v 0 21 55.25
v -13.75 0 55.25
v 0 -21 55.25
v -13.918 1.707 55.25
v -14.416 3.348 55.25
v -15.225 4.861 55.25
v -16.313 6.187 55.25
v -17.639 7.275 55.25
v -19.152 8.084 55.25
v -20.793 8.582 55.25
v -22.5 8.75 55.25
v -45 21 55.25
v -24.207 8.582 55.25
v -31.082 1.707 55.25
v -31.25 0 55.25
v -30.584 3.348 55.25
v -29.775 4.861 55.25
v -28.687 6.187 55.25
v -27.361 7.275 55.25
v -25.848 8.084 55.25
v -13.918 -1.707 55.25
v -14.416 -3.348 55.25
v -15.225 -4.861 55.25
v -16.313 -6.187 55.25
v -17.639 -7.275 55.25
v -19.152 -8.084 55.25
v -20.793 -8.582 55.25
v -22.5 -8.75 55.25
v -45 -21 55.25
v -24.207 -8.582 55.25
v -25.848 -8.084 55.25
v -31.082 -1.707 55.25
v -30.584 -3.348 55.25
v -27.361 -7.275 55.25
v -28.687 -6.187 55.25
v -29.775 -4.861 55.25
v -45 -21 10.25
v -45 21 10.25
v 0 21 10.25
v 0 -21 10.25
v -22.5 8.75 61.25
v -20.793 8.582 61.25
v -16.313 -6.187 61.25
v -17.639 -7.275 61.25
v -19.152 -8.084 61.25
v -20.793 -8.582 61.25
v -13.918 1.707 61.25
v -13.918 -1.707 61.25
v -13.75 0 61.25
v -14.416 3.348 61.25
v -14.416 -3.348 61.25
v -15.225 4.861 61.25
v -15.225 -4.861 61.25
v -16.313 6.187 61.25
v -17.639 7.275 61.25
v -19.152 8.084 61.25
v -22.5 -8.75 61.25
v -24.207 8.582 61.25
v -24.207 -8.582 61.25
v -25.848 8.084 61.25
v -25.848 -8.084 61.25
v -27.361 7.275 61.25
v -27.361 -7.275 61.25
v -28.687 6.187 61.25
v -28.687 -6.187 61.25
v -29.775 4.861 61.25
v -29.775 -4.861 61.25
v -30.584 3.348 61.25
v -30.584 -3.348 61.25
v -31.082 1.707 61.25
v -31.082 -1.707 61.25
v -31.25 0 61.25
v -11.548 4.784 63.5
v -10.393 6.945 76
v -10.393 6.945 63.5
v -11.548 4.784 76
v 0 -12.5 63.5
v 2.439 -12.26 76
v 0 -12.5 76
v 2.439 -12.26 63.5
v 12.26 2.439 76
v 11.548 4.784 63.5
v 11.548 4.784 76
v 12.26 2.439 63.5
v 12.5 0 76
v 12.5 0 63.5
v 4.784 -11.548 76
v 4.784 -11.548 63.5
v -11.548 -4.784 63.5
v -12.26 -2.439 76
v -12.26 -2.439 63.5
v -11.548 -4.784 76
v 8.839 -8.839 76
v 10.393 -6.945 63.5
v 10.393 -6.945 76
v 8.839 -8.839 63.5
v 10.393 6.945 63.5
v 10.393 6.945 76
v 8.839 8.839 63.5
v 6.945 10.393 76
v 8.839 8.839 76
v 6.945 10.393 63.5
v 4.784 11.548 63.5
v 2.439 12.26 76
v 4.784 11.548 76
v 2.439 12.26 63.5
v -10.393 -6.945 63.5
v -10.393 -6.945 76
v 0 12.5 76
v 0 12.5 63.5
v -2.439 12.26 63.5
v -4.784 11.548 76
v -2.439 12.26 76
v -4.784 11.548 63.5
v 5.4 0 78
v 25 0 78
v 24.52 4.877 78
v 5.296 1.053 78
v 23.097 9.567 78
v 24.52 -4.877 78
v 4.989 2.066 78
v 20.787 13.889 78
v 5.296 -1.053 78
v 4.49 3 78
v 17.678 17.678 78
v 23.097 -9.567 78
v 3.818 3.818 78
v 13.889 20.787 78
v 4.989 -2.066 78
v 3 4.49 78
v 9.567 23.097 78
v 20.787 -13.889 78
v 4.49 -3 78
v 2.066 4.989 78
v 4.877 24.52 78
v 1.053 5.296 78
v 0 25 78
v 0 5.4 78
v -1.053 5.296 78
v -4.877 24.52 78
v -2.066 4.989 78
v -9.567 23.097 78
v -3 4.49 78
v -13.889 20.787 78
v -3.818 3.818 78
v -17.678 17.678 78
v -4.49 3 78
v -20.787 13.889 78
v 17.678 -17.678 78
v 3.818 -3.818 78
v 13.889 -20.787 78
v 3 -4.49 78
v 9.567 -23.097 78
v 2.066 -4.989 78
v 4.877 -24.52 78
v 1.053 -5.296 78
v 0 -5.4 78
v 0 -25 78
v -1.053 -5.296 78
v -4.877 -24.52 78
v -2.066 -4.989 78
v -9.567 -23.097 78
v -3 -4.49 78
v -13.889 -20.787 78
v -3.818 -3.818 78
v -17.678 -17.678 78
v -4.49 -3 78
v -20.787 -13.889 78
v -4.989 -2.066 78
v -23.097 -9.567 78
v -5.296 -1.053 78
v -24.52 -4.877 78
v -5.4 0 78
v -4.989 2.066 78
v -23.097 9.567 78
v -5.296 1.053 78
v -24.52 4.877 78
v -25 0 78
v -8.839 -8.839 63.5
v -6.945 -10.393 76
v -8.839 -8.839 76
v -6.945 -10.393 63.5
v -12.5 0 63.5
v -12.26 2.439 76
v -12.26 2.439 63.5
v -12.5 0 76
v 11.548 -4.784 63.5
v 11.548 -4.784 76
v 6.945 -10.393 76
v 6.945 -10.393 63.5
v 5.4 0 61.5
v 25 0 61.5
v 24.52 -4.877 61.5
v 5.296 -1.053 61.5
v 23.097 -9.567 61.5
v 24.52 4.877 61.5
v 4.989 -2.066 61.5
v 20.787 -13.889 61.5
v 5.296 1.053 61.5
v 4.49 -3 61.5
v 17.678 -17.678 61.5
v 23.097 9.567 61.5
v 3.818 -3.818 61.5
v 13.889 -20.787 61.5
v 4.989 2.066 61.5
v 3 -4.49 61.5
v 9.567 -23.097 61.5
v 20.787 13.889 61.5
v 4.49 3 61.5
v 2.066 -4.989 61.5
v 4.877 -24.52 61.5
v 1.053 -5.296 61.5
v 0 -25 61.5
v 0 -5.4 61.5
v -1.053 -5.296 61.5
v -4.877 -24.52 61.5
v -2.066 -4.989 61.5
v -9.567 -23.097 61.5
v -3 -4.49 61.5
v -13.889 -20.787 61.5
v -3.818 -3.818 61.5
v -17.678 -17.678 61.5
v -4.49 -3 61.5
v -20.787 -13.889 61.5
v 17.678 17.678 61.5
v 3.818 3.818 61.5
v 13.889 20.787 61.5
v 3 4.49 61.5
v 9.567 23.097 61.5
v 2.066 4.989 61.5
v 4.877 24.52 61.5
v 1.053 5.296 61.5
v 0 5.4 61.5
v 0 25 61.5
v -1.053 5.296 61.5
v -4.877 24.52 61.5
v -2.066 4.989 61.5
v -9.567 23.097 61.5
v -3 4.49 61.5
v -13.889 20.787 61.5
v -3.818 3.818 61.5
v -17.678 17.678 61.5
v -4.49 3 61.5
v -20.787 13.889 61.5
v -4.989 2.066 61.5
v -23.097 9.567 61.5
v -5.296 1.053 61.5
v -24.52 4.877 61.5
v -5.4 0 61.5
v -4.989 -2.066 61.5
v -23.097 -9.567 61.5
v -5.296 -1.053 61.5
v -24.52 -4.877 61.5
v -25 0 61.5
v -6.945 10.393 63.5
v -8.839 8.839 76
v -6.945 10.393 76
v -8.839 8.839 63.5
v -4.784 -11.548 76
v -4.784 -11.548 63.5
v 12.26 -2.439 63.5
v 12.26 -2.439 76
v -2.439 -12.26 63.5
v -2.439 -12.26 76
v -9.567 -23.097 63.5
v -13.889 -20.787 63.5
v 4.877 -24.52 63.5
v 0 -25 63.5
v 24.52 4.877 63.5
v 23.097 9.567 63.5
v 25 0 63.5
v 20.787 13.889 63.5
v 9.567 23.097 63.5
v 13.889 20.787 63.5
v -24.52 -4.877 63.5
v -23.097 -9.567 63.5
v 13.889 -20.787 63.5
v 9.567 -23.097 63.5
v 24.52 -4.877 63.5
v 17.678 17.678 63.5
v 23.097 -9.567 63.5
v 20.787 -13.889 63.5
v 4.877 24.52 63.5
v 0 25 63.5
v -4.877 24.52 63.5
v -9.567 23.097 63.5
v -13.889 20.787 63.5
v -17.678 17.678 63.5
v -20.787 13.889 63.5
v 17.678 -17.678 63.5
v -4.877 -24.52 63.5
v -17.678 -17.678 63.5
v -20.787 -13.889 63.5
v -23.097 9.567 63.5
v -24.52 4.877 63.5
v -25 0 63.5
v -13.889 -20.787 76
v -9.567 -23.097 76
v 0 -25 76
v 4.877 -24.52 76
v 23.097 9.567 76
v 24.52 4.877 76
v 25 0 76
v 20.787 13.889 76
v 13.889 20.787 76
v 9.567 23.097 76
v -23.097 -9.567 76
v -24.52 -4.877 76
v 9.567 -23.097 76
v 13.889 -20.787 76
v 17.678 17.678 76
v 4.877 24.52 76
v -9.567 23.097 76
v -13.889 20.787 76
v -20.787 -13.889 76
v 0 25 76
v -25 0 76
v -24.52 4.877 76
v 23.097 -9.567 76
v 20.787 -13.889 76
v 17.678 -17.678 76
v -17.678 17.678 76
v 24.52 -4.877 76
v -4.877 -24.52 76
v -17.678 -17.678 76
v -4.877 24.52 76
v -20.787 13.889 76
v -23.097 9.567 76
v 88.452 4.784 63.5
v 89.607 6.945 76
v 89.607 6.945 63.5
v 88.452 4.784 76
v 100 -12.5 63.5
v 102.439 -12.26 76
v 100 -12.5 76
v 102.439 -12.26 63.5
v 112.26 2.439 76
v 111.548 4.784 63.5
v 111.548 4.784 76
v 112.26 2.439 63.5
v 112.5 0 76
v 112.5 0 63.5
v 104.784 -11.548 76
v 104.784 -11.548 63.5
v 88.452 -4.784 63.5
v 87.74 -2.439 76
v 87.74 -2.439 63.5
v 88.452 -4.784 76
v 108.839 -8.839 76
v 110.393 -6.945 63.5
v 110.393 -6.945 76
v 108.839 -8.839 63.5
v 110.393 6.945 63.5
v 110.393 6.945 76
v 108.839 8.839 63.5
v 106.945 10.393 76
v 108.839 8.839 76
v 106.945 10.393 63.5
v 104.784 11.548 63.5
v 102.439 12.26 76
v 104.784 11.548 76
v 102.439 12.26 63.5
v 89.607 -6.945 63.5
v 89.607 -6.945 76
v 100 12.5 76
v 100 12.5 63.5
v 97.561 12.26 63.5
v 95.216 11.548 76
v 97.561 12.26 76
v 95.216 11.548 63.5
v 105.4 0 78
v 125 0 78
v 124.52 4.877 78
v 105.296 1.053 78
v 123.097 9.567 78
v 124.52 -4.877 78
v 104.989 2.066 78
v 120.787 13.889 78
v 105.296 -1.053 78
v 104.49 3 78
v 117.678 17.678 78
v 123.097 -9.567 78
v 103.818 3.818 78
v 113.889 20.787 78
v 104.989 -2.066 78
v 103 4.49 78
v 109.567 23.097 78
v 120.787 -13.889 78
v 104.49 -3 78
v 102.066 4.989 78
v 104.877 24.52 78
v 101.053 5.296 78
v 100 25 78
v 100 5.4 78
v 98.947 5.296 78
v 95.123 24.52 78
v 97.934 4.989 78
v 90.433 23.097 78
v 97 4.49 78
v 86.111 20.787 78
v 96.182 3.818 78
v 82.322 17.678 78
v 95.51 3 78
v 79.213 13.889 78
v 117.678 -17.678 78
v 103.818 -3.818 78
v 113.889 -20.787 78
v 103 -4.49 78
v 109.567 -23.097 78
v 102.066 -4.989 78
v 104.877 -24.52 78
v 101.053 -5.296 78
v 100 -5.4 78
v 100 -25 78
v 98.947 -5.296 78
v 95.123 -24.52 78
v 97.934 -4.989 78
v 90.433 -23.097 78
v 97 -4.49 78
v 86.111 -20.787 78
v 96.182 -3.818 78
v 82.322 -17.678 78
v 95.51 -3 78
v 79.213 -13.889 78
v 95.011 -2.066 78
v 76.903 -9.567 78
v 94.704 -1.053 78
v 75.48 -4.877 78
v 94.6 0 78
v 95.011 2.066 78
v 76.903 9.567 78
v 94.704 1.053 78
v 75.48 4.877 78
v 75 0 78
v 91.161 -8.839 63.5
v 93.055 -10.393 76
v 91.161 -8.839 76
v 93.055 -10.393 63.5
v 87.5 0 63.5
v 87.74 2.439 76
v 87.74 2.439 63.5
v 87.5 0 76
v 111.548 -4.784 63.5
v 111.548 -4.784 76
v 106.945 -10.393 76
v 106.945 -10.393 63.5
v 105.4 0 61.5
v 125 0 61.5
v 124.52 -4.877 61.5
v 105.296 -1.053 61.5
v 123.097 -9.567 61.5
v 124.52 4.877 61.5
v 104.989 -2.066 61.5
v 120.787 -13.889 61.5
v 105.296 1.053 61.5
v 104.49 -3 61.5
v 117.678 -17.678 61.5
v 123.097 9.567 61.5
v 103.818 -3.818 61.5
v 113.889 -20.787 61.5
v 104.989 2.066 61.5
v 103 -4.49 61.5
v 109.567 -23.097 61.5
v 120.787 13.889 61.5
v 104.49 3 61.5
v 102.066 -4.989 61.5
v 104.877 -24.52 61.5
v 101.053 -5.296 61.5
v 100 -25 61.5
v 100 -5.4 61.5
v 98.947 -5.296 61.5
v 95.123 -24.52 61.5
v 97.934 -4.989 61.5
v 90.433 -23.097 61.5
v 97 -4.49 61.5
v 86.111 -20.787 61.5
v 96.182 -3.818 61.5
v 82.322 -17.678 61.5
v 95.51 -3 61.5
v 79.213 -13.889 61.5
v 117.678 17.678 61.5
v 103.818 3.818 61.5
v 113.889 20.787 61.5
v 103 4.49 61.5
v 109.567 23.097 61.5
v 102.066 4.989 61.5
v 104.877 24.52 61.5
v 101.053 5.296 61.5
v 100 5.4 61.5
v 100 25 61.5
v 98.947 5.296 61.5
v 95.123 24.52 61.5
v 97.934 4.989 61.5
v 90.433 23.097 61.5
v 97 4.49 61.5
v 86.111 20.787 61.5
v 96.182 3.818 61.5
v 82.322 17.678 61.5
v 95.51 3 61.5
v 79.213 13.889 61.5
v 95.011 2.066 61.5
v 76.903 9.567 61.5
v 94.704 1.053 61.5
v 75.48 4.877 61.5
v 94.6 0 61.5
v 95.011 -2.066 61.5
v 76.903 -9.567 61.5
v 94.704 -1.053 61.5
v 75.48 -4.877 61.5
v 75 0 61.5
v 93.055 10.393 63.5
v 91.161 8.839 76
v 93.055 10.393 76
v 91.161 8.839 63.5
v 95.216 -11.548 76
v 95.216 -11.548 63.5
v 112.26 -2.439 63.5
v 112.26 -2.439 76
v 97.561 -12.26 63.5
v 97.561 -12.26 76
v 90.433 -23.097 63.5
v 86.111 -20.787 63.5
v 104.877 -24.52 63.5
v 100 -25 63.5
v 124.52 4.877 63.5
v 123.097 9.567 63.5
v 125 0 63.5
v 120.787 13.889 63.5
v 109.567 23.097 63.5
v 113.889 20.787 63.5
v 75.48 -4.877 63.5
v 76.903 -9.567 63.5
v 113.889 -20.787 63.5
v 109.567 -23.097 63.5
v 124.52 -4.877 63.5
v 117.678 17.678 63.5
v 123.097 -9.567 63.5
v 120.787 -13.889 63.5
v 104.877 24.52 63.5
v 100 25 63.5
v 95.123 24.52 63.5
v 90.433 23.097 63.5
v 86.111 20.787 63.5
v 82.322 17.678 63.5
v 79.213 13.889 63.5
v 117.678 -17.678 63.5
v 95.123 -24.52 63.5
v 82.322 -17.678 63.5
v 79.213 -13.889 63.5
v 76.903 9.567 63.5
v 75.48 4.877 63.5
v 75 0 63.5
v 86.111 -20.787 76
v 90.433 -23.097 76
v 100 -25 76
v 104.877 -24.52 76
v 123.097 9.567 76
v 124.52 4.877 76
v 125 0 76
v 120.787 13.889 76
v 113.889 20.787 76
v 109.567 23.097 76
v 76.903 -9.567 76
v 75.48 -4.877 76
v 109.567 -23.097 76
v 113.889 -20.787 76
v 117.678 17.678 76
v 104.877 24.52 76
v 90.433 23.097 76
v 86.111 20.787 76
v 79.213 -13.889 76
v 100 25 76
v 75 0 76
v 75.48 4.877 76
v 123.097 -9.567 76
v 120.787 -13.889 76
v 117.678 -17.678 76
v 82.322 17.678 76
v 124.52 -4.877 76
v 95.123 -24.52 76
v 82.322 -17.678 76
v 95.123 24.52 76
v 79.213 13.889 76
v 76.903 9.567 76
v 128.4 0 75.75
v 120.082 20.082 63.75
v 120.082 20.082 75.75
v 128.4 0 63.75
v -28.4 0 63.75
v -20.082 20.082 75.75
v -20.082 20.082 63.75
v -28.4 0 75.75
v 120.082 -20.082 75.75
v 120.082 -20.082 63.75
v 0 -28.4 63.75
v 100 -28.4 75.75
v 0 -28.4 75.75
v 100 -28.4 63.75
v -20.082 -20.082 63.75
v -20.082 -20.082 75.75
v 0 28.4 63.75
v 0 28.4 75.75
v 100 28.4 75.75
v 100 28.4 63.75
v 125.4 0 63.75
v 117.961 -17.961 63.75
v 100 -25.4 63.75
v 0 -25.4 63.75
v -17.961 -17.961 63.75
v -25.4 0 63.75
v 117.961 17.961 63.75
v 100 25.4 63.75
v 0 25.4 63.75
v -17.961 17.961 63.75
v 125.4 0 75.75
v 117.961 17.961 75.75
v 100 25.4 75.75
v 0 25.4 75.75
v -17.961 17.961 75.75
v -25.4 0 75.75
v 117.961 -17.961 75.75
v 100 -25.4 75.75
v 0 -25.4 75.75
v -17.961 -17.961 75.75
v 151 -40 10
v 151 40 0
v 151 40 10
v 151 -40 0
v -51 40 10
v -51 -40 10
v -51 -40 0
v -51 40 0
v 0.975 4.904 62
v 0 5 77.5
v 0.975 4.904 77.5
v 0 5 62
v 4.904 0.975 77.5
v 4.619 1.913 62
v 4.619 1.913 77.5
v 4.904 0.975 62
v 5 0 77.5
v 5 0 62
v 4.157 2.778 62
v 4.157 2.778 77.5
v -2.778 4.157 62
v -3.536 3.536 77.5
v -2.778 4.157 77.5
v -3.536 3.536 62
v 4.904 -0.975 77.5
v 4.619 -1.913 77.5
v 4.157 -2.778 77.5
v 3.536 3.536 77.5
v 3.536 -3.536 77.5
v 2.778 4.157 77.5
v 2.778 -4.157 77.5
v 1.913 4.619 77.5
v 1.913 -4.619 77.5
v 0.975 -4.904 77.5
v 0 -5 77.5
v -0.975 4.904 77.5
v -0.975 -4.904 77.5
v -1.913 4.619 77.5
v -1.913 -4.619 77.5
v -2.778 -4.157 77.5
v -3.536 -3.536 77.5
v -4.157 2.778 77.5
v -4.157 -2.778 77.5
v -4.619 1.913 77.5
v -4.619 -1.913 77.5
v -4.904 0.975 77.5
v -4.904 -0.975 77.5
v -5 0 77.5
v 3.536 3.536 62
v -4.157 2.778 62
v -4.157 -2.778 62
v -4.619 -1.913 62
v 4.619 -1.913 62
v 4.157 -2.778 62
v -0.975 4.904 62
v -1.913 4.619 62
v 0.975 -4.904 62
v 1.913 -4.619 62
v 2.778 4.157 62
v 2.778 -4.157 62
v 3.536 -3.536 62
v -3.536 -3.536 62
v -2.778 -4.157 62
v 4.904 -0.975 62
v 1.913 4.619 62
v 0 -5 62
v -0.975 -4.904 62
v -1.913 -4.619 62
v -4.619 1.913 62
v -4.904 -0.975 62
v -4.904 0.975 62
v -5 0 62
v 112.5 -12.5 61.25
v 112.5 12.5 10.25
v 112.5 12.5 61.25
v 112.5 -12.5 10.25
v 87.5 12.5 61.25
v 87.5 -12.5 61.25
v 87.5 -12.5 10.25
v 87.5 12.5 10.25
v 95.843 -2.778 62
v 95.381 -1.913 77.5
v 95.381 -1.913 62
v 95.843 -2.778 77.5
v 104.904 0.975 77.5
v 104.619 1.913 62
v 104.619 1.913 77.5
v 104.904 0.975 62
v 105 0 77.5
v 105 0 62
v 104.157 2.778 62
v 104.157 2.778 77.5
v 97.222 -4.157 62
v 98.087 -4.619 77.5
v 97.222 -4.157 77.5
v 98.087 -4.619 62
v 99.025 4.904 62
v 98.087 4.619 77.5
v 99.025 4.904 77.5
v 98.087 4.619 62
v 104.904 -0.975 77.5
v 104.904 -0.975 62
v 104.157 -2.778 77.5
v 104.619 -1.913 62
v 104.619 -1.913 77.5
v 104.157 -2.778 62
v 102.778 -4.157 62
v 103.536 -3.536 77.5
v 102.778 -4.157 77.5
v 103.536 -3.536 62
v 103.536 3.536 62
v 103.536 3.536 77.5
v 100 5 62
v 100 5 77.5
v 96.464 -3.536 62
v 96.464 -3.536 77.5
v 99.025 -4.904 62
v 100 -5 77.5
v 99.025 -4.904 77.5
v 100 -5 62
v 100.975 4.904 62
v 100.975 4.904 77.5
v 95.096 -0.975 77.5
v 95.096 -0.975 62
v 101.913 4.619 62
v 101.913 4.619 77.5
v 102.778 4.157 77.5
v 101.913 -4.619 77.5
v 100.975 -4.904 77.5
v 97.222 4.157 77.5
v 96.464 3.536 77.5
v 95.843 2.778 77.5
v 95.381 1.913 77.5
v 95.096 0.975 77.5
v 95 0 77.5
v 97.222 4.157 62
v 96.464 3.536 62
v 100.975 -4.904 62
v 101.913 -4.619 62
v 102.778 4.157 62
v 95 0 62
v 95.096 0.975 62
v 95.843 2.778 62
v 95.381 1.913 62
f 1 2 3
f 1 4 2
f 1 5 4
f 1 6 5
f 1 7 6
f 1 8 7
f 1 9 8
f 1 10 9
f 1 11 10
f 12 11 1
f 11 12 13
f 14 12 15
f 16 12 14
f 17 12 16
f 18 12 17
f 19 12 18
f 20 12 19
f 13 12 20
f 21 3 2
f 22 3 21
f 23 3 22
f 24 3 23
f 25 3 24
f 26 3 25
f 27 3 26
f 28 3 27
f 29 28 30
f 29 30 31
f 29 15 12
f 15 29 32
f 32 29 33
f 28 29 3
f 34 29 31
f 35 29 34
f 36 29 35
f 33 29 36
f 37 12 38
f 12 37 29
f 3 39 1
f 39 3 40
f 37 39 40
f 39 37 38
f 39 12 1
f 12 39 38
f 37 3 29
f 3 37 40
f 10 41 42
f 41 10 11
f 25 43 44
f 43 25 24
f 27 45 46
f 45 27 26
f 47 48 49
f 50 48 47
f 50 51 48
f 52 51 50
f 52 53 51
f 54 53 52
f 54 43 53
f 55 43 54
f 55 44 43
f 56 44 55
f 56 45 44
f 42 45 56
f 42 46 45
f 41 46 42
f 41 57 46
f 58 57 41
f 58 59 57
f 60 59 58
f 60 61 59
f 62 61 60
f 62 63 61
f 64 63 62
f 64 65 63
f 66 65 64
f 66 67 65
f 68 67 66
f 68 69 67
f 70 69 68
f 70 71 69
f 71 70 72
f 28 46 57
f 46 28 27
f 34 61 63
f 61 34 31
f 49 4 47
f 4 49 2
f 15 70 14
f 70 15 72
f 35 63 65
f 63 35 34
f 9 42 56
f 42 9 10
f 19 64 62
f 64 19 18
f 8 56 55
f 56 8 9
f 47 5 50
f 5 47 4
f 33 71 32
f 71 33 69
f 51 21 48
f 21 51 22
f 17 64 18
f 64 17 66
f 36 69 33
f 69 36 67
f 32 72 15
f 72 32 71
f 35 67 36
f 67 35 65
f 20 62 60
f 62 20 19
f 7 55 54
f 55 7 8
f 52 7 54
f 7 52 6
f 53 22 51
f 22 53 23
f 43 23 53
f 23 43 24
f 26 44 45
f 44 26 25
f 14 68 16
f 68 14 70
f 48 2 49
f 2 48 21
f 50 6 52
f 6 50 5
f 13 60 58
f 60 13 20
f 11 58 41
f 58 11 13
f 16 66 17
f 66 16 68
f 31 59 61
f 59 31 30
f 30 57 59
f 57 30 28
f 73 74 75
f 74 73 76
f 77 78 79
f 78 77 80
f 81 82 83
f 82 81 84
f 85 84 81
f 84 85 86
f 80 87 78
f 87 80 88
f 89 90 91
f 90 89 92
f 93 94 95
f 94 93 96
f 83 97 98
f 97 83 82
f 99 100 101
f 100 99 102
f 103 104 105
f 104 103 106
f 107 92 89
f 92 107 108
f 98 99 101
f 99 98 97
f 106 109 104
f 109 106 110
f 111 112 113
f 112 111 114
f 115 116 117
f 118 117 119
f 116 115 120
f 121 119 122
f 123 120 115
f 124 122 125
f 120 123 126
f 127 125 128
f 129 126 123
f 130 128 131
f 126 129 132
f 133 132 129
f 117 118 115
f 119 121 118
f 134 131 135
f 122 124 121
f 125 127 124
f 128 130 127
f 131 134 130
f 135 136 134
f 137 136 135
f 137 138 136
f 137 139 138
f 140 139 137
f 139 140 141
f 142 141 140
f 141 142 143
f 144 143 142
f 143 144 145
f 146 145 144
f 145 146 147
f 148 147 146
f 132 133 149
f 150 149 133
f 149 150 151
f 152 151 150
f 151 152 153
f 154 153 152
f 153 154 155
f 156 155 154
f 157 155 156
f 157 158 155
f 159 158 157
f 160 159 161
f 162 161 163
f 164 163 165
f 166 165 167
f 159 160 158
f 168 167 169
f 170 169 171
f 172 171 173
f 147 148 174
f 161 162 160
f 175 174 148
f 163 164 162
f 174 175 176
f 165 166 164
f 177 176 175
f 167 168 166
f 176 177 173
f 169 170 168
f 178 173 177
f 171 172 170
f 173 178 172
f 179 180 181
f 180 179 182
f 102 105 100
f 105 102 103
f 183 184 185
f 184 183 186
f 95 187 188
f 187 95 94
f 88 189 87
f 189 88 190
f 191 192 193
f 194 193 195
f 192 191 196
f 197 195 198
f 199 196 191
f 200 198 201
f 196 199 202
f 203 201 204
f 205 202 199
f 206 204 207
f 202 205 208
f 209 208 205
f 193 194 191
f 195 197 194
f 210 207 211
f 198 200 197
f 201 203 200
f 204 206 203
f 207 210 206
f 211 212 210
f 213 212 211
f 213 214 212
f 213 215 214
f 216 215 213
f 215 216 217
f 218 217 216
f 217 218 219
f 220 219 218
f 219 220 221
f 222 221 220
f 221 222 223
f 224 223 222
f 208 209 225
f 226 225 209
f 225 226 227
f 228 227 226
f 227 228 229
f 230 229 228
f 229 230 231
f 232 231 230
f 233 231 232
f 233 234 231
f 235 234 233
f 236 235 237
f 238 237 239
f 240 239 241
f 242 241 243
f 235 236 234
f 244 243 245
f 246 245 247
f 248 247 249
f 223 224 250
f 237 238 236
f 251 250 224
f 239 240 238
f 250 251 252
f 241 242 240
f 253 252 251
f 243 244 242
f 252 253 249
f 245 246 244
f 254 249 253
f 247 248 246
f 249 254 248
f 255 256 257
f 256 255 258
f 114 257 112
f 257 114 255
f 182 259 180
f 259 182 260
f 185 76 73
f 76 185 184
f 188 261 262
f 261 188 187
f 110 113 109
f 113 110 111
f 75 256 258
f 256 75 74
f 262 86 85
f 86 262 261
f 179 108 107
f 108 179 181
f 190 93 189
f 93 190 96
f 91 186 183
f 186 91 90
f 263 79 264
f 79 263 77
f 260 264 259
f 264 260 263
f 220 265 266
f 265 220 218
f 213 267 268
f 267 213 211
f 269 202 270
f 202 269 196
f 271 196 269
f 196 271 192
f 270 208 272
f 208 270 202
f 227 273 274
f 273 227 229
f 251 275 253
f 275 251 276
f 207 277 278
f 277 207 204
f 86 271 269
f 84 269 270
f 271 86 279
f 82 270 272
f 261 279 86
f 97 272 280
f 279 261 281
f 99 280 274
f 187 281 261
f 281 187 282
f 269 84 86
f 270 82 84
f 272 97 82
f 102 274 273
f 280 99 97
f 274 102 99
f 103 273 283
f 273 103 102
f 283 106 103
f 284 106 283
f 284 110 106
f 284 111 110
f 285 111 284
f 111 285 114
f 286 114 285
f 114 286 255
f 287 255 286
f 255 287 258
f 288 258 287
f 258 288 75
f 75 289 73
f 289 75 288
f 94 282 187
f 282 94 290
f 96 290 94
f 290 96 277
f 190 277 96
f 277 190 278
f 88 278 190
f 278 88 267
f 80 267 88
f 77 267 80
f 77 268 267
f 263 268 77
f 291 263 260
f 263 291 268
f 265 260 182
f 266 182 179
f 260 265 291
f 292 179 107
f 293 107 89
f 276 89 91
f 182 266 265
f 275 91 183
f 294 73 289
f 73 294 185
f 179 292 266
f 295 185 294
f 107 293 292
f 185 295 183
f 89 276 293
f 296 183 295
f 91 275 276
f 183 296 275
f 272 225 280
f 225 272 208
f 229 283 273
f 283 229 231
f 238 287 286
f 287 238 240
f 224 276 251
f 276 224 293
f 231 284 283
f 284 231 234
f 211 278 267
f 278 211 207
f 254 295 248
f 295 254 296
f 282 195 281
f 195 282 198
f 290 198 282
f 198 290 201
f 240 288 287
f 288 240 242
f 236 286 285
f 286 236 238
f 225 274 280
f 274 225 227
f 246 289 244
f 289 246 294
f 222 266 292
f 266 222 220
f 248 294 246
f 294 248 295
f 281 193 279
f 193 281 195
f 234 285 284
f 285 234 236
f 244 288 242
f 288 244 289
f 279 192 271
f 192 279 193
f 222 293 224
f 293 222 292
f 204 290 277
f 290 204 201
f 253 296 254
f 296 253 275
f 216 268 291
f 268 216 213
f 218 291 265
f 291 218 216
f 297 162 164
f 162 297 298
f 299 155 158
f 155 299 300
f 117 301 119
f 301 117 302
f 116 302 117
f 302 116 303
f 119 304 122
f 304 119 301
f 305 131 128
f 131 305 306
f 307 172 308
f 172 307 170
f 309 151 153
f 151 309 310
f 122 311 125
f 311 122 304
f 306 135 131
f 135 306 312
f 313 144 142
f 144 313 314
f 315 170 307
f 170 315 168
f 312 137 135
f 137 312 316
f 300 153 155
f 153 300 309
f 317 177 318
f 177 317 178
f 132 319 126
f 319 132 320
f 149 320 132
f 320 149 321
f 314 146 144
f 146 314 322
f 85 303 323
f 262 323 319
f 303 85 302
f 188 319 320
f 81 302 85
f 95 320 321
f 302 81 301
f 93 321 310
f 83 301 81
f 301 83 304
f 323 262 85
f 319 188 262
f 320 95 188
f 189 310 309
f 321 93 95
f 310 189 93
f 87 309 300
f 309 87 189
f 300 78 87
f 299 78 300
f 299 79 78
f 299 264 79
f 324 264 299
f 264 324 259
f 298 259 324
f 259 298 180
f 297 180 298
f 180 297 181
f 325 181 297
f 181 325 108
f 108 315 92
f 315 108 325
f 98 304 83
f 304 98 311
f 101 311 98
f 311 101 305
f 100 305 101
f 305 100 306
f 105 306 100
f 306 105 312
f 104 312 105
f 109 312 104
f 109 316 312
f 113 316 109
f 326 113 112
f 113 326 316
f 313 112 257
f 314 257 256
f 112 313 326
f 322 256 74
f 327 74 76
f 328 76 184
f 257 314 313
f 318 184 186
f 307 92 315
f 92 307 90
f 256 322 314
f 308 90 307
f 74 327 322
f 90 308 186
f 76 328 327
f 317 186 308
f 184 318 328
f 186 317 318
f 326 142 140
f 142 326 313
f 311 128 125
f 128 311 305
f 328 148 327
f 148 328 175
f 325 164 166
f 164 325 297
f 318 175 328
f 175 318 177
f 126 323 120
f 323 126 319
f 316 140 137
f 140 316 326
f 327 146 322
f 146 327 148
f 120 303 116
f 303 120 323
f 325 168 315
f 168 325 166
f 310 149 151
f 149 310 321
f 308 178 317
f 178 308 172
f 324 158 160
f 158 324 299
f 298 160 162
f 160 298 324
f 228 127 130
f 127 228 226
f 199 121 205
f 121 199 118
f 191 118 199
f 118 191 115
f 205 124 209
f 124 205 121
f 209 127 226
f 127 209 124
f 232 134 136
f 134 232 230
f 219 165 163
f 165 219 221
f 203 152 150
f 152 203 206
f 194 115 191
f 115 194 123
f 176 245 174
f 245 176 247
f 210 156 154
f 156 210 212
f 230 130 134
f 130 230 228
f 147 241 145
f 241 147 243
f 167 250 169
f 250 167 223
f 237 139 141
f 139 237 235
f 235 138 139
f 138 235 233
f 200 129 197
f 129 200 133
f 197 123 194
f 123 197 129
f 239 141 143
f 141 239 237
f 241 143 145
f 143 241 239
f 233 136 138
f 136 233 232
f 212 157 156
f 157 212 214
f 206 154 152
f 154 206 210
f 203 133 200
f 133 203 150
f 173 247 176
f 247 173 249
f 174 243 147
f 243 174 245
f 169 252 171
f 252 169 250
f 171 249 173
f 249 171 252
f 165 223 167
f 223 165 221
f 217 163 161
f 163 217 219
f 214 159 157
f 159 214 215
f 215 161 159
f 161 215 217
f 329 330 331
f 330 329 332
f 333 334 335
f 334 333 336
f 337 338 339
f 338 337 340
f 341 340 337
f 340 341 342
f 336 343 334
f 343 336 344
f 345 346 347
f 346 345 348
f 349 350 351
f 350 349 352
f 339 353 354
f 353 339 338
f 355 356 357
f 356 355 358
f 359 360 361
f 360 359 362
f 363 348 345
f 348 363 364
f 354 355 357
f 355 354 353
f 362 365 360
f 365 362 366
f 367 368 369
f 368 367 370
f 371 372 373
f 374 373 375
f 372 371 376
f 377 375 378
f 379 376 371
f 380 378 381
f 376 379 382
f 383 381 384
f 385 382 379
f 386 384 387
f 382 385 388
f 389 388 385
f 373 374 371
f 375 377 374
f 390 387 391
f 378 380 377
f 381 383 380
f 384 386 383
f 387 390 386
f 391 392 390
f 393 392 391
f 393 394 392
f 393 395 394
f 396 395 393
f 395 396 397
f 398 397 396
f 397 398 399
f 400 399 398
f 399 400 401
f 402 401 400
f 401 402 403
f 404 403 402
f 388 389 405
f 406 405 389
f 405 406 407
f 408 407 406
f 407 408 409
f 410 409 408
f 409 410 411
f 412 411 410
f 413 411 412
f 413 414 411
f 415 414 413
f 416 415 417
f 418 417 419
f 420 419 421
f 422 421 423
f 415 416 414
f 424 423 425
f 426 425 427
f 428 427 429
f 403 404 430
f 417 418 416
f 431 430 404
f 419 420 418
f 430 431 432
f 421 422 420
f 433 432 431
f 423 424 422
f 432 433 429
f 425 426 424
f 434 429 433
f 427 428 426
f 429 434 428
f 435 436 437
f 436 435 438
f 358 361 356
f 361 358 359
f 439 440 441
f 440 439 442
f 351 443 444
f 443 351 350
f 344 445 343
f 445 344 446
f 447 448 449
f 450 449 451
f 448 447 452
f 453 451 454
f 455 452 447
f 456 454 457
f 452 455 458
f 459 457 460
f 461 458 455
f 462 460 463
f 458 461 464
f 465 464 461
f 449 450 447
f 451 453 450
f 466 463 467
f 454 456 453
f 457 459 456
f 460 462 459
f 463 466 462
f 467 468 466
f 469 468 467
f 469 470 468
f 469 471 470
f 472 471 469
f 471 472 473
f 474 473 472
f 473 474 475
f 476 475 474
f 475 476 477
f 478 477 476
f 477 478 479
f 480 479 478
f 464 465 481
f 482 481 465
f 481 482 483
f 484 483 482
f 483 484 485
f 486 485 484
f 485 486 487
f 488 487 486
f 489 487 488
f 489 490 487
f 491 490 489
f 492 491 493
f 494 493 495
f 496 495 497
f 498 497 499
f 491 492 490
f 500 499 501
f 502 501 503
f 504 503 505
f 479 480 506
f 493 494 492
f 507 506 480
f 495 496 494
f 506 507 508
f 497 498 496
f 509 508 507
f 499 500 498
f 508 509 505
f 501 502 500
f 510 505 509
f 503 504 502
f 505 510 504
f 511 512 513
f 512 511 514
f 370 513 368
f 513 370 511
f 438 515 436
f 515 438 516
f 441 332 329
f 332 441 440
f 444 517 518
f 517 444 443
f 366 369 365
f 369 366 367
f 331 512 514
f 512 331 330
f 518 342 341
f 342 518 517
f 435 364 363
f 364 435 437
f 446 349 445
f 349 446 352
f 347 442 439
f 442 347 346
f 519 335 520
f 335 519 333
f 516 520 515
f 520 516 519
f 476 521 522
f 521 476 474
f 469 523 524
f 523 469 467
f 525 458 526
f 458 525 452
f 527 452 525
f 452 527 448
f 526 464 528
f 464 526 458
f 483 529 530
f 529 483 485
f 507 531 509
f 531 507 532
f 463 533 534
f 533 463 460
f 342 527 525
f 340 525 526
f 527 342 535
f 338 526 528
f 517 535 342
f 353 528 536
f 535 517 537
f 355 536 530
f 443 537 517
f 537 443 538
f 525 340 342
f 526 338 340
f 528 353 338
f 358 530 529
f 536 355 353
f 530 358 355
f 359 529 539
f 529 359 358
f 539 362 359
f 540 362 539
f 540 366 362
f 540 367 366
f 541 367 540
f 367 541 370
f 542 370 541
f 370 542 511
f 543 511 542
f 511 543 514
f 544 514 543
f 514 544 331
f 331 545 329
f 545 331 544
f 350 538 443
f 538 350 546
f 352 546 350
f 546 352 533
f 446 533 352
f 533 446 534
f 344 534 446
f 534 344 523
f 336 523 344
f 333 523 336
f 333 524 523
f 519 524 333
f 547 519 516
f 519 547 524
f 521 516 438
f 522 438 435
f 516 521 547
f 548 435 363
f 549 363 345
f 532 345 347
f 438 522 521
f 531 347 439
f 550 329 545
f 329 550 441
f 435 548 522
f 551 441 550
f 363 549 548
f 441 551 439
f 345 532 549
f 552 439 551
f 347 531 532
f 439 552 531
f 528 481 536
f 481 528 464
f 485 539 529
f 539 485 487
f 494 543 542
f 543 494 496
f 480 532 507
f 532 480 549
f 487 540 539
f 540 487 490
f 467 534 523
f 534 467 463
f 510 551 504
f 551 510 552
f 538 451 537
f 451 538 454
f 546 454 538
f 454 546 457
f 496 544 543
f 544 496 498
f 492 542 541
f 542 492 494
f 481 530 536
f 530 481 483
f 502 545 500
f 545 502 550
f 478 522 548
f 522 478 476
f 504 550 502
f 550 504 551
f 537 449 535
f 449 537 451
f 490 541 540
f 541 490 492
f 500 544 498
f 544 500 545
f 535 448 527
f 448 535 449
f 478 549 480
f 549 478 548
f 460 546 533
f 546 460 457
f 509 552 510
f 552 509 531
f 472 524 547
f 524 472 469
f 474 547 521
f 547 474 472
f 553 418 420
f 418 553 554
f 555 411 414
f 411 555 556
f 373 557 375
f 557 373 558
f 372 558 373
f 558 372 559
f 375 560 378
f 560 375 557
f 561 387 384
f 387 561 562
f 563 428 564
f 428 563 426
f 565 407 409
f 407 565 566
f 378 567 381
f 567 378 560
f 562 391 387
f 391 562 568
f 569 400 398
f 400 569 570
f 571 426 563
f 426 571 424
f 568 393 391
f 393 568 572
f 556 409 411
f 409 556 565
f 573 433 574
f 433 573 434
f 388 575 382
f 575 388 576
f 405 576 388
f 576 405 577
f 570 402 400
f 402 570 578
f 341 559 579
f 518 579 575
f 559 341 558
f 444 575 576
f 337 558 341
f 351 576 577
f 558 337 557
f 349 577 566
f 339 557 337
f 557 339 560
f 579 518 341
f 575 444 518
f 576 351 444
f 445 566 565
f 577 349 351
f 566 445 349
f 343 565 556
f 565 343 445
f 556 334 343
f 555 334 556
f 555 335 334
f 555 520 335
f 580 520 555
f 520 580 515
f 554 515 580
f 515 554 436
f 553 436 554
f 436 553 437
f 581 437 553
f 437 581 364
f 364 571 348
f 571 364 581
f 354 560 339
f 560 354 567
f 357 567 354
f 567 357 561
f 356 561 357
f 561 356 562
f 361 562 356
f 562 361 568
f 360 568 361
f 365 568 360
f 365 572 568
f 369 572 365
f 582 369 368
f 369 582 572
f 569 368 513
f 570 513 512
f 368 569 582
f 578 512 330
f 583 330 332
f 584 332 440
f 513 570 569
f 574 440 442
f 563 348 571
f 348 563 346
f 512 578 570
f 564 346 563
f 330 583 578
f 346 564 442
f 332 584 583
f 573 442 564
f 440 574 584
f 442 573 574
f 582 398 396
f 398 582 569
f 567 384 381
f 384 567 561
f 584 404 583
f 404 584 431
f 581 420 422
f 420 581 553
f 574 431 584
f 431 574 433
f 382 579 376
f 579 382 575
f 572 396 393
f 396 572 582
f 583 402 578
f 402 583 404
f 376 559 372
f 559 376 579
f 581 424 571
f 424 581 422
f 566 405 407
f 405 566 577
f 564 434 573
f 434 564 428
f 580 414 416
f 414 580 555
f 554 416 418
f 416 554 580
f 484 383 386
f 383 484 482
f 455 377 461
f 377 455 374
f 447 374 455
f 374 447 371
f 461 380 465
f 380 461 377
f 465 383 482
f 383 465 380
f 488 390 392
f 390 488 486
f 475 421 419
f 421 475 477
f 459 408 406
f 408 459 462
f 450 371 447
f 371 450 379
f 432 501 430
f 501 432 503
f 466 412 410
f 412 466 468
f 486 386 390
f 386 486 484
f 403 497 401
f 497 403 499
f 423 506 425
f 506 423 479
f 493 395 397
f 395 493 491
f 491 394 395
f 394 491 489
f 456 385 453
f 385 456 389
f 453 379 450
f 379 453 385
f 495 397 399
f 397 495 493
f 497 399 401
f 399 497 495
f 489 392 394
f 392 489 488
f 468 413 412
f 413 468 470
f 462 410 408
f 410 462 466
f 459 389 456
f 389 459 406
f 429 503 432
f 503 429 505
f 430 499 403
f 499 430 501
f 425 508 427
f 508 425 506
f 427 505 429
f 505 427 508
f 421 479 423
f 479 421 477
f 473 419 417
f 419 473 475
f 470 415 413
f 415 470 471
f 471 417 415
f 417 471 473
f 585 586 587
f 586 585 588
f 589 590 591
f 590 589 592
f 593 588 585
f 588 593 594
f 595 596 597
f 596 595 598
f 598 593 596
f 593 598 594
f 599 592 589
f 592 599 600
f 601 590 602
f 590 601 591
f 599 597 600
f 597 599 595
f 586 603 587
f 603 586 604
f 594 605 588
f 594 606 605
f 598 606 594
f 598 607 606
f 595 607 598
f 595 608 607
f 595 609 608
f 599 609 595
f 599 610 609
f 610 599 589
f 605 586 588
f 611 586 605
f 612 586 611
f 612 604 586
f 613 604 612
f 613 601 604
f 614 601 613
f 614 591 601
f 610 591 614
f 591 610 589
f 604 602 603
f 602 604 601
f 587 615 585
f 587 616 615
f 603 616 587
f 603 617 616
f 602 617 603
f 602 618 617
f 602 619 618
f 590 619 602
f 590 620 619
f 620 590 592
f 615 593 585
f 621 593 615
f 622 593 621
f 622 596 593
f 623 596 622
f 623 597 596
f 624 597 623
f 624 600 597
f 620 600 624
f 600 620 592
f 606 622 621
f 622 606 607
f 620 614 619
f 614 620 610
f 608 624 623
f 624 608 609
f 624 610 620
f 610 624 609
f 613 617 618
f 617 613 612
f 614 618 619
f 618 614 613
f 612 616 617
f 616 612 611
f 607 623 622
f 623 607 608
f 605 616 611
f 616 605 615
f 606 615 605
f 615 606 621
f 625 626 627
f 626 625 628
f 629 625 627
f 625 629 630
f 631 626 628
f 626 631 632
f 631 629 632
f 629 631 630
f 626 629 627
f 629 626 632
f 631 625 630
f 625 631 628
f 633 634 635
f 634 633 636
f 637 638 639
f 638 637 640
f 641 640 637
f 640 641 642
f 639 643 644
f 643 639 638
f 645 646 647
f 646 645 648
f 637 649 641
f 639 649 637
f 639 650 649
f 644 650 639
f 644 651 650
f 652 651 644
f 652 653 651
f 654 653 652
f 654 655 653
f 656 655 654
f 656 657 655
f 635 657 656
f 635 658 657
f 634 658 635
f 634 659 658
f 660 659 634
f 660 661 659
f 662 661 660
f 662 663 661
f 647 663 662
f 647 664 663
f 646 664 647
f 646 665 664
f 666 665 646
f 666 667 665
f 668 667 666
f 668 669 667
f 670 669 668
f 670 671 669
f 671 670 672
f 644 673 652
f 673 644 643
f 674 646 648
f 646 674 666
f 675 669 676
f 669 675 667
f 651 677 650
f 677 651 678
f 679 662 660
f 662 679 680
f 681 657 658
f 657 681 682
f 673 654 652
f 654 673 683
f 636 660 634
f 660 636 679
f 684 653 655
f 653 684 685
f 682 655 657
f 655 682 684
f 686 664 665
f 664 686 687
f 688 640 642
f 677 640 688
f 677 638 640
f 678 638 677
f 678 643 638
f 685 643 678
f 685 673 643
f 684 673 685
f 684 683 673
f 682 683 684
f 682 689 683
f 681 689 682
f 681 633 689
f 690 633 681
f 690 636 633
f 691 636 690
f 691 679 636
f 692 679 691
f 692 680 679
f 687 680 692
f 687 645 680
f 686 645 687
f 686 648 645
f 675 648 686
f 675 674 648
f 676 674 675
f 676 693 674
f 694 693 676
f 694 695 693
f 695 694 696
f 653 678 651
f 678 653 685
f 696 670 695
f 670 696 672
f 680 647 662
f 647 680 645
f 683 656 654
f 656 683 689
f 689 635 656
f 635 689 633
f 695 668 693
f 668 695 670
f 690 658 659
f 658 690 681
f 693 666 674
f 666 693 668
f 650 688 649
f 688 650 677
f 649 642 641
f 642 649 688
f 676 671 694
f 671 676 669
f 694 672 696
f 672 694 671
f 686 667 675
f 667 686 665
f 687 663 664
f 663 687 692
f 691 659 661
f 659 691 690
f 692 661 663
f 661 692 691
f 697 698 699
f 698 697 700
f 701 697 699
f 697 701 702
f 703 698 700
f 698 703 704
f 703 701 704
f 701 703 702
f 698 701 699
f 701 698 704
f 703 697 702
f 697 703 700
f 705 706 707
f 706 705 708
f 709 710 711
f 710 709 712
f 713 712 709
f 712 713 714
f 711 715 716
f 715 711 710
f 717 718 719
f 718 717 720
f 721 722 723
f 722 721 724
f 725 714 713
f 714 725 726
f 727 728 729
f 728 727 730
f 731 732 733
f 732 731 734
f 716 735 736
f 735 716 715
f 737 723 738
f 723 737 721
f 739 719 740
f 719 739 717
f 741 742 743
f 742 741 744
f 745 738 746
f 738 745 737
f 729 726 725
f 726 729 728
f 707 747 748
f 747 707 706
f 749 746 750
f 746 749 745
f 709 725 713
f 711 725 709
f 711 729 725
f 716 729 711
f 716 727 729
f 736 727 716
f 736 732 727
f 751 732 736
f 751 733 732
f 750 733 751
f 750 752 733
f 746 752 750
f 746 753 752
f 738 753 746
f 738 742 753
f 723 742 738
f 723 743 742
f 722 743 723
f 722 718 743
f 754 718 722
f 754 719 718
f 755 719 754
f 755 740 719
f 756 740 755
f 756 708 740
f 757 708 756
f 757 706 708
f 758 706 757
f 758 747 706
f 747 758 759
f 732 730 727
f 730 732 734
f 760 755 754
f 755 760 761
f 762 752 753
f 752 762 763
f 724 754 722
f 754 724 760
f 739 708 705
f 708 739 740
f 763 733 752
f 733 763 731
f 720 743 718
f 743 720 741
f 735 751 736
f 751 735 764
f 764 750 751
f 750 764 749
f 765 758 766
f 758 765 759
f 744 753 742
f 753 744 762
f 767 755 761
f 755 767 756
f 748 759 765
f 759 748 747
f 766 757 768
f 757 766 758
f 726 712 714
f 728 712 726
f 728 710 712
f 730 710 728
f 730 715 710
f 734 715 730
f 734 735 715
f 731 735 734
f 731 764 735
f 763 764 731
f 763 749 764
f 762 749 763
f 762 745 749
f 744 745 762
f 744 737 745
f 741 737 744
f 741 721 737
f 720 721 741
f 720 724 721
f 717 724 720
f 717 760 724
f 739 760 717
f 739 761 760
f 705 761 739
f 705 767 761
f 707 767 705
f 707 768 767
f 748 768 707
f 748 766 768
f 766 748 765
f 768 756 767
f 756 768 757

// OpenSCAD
$fn = 32;

// ------------------------------------------------------------------------
// Motor belt drive: span 100 mm, pulleys d50, belt 12 mm wide
// Every part is its own module, assembly() places every instance.
// ------------------------------------------------------------------------

// --- part 1 ---
module base_plate() {
  difference() {
    translate([-101, -40, 0]) cube([202, 80, 10]);
  }
}

// --- part 2 ---
module motor() {
  union() {
    translate([-22.5, -21, 0]) cube([45, 42, 45]);
    translate([25.5, 0, 22.5]) rotate([0, 90, 0]) cylinder(h = 6, d = 17.5, center = true);
  }
}

// --- part 3 ---
module drive_shaft() {
  translate([0, 0, -7.75]) cylinder(h = 15.5, d = 10);
}

// --- part 4 ---
module pulley_drive() {
  difference() {
    union() {
      cylinder(h = 16.5, d = 25);
      cylinder(h = 2, d = 50);
      translate([0, 0, 14.5]) cylinder(h = 2, d = 50);
    }
    translate([0, 0, -1]) cylinder(h = 18.5, d = 10.8);
  }
}

// --- part 5 ---
module idler_post() {
  translate([-12.5, -12.5, 0]) cube([25, 25, 51]);
}

// --- part 6 ---
module driven_shaft() {
  translate([0, 0, -7.75]) cylinder(h = 15.5, d = 10);
}

// --- part 7 ---
module pulley_driven() {
  difference() {
    union() {
      cylinder(h = 16.5, d = 25);
      cylinder(h = 2, d = 50);
      translate([0, 0, 14.5]) cylinder(h = 2, d = 50);
    }
    translate([0, 0, -1]) cylinder(h = 18.5, d = 10.8);
  }
}

// --- part 8 ---
module drive_belt() {
  difference() {
    linear_extrude(height = 12) polygon(points = concat([for (a = [90 : 45 : 270]) [28.4 * cos(a), 28.4 * sin(a)]], [for (a = [270 : 45 : 450]) [100 + 28.4 * cos(a), 28.4 * sin(a)]]));
    translate([0, 0, -1]) linear_extrude(height = 14) polygon(points = concat([for (a = [90 : 45 : 270]) [25.4 * cos(a), 25.4 * sin(a)]], [for (a = [270 : 45 : 450]) [100 + 25.4 * cos(a), 25.4 * sin(a)]]));
  }
}

// --- assembly ---
module assembly() {
  color([0.80, 0.24, 0.20]) translate([50, 0, 0]) rotate([0, 0, 0]) base_plate();
  color([0.20, 0.45, 0.75]) translate([0, 0, 32.75]) rotate([0, 270, 0]) motor();
  color([0.25, 0.62, 0.32]) translate([0, 0, 69.75]) rotate([0, 0, 0]) drive_shaft();
  color([0.92, 0.70, 0.18]) translate([0, 0, 61.5]) rotate([0, 0, 0]) pulley_drive();
  color([0.58, 0.35, 0.70]) translate([100, 0, 10.25]) rotate([0, 0, 0]) idler_post();
  color([0.16, 0.66, 0.66]) translate([100, 0, 69.75]) rotate([0, 0, 0]) driven_shaft();
  color([0.85, 0.48, 0.18]) translate([100, 0, 61.5]) rotate([0, 0, 0]) pulley_driven();
  color([0.55, 0.60, 0.65]) translate([0, 0, 63.75]) rotate([0, 0, 0]) drive_belt();
}

assembly();
